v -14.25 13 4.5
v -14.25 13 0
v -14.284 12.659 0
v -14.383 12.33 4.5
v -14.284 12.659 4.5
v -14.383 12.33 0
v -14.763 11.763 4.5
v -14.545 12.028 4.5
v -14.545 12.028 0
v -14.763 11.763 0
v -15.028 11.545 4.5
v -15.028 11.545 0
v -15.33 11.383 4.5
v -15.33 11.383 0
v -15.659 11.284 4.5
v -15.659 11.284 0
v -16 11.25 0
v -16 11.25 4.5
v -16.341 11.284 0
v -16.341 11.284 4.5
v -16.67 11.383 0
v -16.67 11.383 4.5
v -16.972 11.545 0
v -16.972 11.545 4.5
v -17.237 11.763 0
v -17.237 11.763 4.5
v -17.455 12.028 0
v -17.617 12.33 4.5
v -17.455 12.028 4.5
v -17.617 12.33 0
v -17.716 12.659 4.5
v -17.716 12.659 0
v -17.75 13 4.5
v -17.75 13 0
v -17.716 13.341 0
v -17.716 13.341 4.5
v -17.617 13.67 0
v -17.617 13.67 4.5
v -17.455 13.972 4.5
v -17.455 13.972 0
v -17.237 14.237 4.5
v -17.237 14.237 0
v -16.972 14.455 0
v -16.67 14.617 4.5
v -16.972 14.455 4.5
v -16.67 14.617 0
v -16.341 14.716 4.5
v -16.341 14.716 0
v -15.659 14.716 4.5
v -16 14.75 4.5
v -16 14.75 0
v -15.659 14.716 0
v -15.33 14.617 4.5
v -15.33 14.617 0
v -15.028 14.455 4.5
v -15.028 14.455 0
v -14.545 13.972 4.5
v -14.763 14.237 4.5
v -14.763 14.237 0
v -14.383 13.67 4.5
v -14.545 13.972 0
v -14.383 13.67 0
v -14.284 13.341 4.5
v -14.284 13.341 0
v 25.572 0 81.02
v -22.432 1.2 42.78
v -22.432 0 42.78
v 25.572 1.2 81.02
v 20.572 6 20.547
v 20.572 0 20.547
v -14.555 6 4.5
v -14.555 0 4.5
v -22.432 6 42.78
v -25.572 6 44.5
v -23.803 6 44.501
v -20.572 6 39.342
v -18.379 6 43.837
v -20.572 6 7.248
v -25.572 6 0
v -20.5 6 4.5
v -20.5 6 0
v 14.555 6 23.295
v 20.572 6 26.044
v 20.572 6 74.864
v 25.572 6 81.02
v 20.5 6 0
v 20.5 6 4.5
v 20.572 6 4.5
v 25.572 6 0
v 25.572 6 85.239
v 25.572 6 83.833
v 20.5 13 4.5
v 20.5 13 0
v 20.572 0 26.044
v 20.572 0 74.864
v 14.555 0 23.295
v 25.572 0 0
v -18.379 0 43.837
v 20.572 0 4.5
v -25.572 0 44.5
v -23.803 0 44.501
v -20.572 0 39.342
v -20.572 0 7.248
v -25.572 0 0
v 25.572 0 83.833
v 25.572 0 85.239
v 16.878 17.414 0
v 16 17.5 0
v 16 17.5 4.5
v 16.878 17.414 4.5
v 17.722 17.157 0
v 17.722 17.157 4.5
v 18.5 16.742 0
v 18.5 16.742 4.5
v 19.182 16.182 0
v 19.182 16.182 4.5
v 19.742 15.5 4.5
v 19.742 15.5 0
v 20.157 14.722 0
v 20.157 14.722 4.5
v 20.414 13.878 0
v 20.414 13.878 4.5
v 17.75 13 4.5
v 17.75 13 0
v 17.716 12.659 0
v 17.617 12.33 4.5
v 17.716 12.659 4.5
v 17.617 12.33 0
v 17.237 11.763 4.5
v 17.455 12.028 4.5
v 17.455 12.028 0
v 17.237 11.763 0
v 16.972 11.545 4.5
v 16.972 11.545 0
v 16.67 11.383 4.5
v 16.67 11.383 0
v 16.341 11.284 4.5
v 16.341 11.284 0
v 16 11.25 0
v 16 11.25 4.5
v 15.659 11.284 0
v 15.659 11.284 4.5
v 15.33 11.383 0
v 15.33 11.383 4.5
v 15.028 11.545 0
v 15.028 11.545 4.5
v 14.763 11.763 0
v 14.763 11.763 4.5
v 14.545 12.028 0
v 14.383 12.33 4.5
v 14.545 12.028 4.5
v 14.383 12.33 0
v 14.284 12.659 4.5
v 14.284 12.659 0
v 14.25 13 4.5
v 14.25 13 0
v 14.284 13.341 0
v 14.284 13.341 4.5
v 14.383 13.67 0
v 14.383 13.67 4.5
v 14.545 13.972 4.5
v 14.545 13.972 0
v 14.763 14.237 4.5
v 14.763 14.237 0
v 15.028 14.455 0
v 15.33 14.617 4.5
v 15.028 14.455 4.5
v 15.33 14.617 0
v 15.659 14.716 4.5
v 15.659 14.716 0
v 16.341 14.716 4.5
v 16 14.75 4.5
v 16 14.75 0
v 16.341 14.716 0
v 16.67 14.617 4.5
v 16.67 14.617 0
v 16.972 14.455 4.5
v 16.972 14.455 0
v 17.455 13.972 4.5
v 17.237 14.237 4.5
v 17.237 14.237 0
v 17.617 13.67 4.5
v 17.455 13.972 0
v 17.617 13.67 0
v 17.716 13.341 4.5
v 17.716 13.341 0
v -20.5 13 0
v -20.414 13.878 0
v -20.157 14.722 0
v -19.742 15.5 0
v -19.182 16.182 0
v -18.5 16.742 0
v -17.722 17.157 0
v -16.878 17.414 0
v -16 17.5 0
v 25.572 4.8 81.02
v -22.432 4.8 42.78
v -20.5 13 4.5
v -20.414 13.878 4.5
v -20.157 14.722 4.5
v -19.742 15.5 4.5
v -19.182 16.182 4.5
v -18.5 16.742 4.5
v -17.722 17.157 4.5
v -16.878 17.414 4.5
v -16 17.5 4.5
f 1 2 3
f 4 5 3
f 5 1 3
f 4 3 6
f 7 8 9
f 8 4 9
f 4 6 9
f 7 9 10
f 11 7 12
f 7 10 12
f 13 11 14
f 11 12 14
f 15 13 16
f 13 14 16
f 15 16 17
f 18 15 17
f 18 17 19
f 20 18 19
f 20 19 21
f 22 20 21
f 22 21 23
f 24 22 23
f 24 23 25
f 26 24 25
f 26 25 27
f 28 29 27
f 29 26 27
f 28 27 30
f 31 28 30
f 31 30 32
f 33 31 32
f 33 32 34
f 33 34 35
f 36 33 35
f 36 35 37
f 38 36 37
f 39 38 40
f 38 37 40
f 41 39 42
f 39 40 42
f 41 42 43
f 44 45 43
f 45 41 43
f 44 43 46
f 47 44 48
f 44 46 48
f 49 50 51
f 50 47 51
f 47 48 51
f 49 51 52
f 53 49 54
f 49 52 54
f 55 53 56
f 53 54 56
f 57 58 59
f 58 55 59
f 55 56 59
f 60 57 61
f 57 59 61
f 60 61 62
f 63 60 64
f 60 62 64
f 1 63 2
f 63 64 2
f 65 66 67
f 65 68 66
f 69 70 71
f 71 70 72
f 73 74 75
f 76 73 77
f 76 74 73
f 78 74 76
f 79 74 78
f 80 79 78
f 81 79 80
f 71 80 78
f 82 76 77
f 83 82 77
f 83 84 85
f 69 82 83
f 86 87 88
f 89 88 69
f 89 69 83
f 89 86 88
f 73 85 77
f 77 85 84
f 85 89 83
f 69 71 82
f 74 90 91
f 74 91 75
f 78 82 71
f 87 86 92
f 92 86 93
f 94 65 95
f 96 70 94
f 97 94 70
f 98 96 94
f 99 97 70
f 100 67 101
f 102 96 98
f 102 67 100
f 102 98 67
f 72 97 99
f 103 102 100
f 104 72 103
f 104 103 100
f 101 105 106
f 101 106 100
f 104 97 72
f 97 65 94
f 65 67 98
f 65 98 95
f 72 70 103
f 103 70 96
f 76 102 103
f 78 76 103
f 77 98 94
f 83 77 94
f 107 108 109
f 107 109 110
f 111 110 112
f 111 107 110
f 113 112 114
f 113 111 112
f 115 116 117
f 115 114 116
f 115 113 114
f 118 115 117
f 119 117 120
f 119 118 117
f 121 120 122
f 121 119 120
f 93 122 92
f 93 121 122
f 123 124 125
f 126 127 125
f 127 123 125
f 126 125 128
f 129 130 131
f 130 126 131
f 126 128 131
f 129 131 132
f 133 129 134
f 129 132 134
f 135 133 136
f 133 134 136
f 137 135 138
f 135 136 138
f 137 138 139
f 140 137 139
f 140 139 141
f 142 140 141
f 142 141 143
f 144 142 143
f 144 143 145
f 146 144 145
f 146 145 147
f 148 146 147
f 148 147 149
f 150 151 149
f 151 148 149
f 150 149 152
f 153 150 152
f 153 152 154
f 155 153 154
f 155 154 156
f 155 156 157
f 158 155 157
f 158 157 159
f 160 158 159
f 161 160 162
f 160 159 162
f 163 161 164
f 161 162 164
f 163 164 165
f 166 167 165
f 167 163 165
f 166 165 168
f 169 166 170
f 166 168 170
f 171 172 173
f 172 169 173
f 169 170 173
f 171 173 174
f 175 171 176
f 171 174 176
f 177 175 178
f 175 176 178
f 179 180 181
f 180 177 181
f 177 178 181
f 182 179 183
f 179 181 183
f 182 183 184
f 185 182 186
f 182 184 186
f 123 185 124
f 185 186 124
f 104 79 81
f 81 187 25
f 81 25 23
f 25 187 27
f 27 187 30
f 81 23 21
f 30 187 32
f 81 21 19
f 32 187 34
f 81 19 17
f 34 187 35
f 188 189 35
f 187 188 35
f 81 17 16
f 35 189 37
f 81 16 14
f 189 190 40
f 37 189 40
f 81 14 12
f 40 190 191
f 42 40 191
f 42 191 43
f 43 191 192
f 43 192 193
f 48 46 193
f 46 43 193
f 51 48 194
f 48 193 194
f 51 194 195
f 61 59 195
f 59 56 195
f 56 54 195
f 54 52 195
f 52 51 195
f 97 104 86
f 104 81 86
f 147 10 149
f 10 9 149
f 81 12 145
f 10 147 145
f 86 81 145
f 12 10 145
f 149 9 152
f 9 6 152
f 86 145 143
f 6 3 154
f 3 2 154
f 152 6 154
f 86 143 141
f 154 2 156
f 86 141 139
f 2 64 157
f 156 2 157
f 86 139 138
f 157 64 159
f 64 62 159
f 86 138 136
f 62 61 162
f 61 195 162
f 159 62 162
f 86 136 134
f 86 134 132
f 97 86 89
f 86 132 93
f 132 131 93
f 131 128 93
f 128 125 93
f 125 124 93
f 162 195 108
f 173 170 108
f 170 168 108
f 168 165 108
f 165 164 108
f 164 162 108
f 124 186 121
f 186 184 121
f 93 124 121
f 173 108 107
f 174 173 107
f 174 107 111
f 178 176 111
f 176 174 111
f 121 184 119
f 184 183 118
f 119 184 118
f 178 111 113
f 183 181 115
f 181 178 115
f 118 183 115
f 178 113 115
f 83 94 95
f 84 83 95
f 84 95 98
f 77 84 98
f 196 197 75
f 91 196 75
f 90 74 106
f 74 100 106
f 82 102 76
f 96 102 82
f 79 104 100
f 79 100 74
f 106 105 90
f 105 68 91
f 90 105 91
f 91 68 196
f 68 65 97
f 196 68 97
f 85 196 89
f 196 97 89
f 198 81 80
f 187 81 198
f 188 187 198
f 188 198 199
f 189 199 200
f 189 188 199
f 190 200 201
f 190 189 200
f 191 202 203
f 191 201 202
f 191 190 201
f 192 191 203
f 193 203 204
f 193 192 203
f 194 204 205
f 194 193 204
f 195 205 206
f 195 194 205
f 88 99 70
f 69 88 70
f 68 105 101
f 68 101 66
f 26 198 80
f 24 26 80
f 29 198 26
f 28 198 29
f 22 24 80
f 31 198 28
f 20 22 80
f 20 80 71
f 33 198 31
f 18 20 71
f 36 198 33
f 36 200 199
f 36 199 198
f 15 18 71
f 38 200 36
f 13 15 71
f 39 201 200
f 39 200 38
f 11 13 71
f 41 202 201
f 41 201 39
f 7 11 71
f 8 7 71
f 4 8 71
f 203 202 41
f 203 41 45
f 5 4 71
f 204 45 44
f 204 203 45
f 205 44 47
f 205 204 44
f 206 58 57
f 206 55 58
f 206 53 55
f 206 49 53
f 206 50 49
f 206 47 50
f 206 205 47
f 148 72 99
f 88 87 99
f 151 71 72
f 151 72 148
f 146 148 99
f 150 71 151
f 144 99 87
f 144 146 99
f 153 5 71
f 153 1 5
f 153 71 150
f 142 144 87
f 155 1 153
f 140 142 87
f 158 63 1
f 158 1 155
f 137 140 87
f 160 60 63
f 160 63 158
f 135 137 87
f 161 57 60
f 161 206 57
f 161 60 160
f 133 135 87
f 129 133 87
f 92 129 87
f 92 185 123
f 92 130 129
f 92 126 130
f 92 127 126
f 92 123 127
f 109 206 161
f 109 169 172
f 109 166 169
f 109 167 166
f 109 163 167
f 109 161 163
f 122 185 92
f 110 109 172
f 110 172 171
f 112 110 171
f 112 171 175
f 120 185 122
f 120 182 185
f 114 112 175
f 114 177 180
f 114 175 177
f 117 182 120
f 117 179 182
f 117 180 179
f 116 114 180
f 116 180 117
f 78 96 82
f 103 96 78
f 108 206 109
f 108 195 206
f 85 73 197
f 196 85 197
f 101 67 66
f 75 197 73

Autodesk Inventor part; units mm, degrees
ref_plane "YZ Plane" through (0, 0, 0) normal (1, 0, 0) x (0, 1, 0)
sketch "Sketch1" plane through (0, 0, 0) normal (0, 0, 1) x (1, 0, 0)
  circle A0 centre (-16, 13) radius 1.75
  circle A1 centre (16, 13) radius 1.75
  line L0 (-16, 13) -> (16, 13) construction
  line L1 (0, 13) -> (0, 0) construction
  line L2 (0, 0) -> (-25.5715, 0)
  line L3 (-25.5715, 0) -> (-25.5715, 6)
  line L4 (-25.5715, 6) -> (-20.5, 6)
  line L5 (-20.5, 6) -> (-20.5, 13)
  line L6 (-16, 17.5) -> (0, 17.5)
  arc A2 (-16, 17.5) -> (-20.5, 13) centre (-16, 13) ccw
  circle A3 centre (16, 13) radius 1.75
  line L7 (0, 0) -> (25.5715, 0)
  line L8 (25.5715, 0) -> (25.5715, 6)
  line L9 (25.5715, 6) -> (20.5, 6)
  line L10 (20.5, 6) -> (20.5, 13)
  line L11 (16, 17.5) -> (0, 17.5)
  arc A4 (20.5, 13) -> (16, 17.5) centre (16, 13) ccw
  dimension "d0" = 3.5
  dimension "d1" = 3.5
  dimension "d2" = 32
  dimension "d3" = 13
  dimension "d4" = 25.5715
  dimension "d5" = 6
  dimension "d18" = 4.5
extrude "Extrusion1" add sketch "Sketch1" along normal blind 4.5
sketch "Sketch2" plane through (-25.5715, 0, 0) normal (0, -1, 0) x (1, 0, 0)
  line L0 (0, 0) -> (51.143, 0) projected
  line L1 (51.143, 0) -> (51.143, 4.5) projected
  line L2 (0, 4.5) -> (51.143, 4.5) projected
  line L3 (0, 0) -> (0, 4.5) projected
  line L4 (0, 4.5) -> (0, 44.5)
  line L5 (0, 44.5) -> (51.143, 85.2393)
  line L6 (51.143, 85.2393) -> (51.143, 4.5)
  line L7 (46.143, 4.5) -> (46.143, 74.864)
  line L8 (46.143, 74.864) -> (5, 42.0904)
  line L9 (5, 42.0904) -> (5, 4.5)
  line L10 (5, 4.5) -> (46.143, 23.2952) construction
  line L11 (5, 42.0904) -> (46.143, 23.2952) construction
  line L12 (5, 23.2952) -> (46.143, 23.2952) construction
  line L13 (5, 4.5) -> (0, 4.5)
  line L14 (46.143, 4.5) -> (51.143, 4.5)
  line L15 (7.1928, 43.8372) -> (46.143, 26.0437)
  line L16 (5, 39.3419) -> (40.1265, 23.2952)
  line L17 (40.1265, 23.2952) -> (5, 7.2485)
  line L18 (46.143, 20.5467) -> (11.0165, 4.5)
  line L19 (5, 7.2485) -> (5, 4.5)
  point P0 (25.5715, 0)
  dimension "d9" = 128.54
  dimension "d10" = 40
  dimension "d11" = 5
  dimension "d14" = 2.5
  dimension "d15" = 2.5
extrude "Extrusion2" add sketch "Sketch2" against normal blind 6 contours L4 L5 L6 L2 L7 L8 L9 | L9 L17 L16 L8 L15 L7 L18 L2
ref_plane "Work Plane1" through (25.5715, 0, 85.2393) normal (0.7822, 0, 0.6231) x (0, 1, 0)
sketch "Sketch4" plane through (25.5715, 0, 85.2393) normal (0.7822, 0, 0.6231) x (0, 1, 0)
  line L0 (0, -66.6719) -> (6, -66.6719) projected
  line L1 (6, -66.6719) -> (6, 0) projected
  line L2 (0, 0) -> (6, 0) projected
  line L3 (0, -66.6719) -> (0, 0) projected
  line L4 (0, -1.1) -> (1.2, -3.3)
  line L5 (1.2, -3.3) -> (0, -3.3)
  line L6 (3, 0) -> (3, -3.4483) construction
  point P0 (0, -50.7393)
  dimension "d29" = 1.1
  dimension "d30" = 3.3
  dimension "d31" = 3.6
extrude "Extrusion4" cut sketch "Sketch4" against normal blind 64 contours L3 L4 L5
ref_plane "Work Plane2" through (-25.5715, 3, 0) normal (0, -1, 0) x (1, 0, 0)
mirror "Mirror1" about plane through (-25.5715, 3, 0) normal (0, -1, 0) of "Extrusion4"
equation "\"d14\" = 0.5 * d11"
equation "\"d15\" = d14"
properties part number "Base_ScreenHolder_L"
